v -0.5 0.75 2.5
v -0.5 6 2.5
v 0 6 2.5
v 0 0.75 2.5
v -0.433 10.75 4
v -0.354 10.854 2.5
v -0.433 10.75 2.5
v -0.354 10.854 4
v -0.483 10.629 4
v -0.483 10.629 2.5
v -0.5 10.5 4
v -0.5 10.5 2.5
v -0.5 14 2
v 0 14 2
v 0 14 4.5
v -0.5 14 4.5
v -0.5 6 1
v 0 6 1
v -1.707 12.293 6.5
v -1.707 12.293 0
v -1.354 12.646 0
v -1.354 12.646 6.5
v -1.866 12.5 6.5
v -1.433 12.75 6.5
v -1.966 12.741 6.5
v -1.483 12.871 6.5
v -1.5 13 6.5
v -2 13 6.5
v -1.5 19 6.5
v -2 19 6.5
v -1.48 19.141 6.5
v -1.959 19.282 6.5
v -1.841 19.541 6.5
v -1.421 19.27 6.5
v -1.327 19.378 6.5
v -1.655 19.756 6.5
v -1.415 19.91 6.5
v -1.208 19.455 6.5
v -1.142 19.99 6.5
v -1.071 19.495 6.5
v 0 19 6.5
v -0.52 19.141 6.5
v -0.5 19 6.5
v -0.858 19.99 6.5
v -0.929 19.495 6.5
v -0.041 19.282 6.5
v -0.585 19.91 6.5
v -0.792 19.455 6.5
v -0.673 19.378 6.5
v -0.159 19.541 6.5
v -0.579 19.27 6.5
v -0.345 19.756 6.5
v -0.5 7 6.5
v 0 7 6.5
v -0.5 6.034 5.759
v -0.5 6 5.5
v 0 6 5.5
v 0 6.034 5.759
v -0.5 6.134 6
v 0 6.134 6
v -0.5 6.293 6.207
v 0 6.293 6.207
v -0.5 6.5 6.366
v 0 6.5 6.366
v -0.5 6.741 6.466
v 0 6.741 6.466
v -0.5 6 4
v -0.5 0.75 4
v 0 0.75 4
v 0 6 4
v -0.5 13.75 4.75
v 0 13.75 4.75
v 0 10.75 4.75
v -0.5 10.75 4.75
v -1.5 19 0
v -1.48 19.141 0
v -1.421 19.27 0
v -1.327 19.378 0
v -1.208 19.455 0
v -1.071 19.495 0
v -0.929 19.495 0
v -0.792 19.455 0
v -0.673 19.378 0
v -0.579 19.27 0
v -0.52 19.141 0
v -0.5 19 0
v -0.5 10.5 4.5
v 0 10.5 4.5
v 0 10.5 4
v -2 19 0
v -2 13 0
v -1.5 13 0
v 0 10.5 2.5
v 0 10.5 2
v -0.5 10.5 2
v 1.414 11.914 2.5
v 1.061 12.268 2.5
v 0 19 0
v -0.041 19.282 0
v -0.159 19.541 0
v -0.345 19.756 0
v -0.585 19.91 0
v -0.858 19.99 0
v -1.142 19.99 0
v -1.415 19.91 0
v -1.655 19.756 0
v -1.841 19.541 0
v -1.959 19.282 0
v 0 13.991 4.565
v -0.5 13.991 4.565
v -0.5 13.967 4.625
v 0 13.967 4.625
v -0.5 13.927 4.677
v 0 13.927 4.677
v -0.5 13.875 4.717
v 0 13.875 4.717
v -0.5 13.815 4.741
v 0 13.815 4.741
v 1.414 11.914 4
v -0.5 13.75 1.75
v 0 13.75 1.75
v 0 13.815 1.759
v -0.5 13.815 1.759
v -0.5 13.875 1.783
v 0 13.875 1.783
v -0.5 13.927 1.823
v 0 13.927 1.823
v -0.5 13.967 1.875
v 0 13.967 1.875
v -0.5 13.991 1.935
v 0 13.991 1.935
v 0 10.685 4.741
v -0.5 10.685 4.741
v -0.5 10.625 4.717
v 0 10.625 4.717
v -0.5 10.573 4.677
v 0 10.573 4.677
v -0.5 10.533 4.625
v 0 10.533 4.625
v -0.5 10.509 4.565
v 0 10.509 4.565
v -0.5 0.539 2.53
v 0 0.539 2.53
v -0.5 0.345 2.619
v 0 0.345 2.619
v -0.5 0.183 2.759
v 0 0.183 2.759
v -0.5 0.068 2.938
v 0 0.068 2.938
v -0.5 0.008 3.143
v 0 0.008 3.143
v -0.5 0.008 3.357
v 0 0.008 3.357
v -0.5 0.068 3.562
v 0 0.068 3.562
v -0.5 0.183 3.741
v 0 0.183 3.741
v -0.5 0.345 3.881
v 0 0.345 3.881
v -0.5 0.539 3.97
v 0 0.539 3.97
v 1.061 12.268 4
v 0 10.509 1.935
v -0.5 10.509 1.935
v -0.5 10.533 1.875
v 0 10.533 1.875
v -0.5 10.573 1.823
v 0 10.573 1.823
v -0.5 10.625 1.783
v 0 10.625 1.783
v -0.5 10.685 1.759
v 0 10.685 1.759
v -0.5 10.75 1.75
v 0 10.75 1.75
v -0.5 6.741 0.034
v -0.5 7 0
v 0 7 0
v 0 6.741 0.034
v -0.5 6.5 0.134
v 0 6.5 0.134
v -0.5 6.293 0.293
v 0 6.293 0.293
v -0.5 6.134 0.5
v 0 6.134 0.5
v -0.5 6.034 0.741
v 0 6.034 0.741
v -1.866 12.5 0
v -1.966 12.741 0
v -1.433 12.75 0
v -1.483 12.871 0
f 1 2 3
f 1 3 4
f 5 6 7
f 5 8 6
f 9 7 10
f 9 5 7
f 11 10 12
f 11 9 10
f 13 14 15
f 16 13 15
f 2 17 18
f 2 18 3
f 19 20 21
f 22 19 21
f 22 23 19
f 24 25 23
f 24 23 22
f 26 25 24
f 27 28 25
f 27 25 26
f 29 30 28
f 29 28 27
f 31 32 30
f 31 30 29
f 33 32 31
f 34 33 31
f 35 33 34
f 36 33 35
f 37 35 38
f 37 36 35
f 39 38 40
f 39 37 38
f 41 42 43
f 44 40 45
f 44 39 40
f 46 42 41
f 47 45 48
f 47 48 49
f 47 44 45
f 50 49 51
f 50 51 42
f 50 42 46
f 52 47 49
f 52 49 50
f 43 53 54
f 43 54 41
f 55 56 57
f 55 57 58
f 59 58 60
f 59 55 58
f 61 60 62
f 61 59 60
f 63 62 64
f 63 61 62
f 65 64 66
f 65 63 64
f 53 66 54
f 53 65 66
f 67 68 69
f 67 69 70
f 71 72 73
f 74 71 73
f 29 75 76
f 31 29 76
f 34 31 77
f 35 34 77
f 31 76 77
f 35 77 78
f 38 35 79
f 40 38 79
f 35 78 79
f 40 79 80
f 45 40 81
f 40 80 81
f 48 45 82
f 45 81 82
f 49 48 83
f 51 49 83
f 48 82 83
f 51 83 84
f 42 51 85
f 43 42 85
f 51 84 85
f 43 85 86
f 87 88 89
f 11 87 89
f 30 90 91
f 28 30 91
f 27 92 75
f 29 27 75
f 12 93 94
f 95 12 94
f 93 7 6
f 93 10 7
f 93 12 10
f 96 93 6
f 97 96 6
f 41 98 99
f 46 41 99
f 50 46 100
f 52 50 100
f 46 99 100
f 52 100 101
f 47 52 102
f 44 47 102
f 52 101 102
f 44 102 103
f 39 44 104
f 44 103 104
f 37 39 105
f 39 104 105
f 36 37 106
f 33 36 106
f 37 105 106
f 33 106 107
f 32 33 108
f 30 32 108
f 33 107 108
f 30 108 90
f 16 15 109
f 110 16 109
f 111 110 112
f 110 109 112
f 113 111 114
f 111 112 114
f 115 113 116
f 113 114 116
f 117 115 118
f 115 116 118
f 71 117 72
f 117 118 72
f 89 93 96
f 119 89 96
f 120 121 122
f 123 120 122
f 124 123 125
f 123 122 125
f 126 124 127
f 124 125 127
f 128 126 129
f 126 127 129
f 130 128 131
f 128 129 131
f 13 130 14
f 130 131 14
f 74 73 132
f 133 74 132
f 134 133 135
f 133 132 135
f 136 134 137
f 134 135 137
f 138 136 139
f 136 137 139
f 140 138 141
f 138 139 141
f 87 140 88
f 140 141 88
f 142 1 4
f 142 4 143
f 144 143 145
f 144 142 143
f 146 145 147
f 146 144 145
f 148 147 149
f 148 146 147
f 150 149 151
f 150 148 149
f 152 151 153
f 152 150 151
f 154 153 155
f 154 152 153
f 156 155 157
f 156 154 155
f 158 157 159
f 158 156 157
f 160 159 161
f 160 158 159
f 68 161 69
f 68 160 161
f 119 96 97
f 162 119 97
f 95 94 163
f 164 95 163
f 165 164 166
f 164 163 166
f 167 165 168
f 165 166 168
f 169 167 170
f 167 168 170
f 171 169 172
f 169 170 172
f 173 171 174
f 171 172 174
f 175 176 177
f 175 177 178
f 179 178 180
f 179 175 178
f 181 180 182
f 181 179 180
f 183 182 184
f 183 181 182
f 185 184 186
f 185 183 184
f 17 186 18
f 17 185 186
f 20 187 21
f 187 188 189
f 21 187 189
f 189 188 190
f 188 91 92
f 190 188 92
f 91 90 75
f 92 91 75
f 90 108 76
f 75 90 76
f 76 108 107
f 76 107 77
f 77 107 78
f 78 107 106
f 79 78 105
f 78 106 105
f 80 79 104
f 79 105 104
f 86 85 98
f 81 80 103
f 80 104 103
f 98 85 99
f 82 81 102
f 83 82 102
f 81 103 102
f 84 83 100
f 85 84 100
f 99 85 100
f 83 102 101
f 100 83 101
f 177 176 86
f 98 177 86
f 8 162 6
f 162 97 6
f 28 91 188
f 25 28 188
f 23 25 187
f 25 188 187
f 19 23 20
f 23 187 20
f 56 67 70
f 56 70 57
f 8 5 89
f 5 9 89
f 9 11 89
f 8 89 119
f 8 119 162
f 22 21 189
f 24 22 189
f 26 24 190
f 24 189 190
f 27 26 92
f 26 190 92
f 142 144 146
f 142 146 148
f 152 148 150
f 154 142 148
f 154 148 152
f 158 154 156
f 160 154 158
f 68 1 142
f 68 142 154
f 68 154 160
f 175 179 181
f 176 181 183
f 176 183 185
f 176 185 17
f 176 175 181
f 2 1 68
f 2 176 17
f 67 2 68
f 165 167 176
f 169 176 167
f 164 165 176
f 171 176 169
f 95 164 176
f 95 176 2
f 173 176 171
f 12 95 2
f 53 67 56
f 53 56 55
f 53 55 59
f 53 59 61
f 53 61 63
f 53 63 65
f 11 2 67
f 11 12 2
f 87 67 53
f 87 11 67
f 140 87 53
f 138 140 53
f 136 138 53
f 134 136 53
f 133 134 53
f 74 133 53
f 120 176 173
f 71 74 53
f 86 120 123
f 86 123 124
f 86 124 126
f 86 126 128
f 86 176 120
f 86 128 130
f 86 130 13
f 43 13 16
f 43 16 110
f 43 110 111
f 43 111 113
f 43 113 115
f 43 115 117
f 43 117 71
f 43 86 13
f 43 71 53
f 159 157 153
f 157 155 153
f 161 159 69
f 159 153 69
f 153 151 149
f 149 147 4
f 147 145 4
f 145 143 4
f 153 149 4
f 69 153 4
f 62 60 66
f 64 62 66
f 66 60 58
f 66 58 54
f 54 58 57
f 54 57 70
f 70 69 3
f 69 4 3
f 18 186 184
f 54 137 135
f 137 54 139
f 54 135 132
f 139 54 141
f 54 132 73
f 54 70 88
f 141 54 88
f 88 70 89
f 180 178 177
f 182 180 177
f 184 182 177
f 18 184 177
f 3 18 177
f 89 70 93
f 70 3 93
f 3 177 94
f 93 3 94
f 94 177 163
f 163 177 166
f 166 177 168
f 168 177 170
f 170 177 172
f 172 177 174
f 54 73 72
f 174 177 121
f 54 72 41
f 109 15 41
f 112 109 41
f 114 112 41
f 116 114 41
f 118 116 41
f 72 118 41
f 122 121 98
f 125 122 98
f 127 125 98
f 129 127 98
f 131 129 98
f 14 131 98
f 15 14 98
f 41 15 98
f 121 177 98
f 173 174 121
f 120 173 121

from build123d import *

# Parameters (mm, degrees)
EXTRUDE_1_DEPTH     = 6.5
CUT_EXTRUDE_1_DEPTH = 2
SKETCH_3_W          = 2
SKETCH_3_H          = 2
CUT_EXTRUDE_2_DEPTH = 2.5
SKETCH_4_W          = 2
SKETCH_4_H          = 2
CUT_EXTRUDE_3_DEPTH = 2.5
CUT_EXTRUDE_4_DEPTH = 0.6
SKETCH_6_W          = 1.5
SKETCH_6_H          = 0.707106781
EXTRUDE_2_DEPTH     = 0.5
CUT_EXTRUDE_5_DEPTH = 2
FILLET_1_R          = 0.5


with BuildPart() as part:
    # Эскиз1 → Бобышка-Вытянуть1 (new body)
    with BuildSketch(Plane.XY):
        with BuildLine():
            Line((-2, 19), (-2, 13))
            ThreePointArc((-2, 13), (-1.923879533, 12.617316568), (-1.707106781, 12.292893219))
            Line((-1.707106781, 12.292893219), (-1.353553391, 12.646446609))
            ThreePointArc((-1.353553391, 12.646446609), (-1.461939766, 12.808658284), (-1.5, 13))
            Line((-1.5, 13), (-1.5, 19))
            ThreePointArc((-1.5, 19), (-1, 19.5), (-0.5, 19))
            Line((-0.5, 19), (-0.5, 0))
            Line((-0.5, 0), (0, 0))
            Line((0, 0), (0, 10.5))
            Line((0, 10.5), (1.414213562, 11.914213562))
            Line((1.414213562, 11.914213562), (1.060660172, 12.267766953))
            Line((1.060660172, 12.267766953), (0, 11.207106781))
            Line((0, 11.207106781), (0, 19))
            ThreePointArc((0, 19), (-1, 20), (-2, 19))
        make_face()
    extrude(amount=EXTRUDE_1_DEPTH)

    # Эскиз2 → Вырез-Вытянуть1 (cut)
    with BuildSketch(Plane.ZY.offset(0.5)):
        with BuildLine():
            Line((4, 6), (5.5, 6))
            ThreePointArc((5.5, 6), (6.207106781, 6.292893219), (6.5, 7))
            Line((6.5, 7), (8.5, 7))
            Line((8.5, 7), (8.5, -1))
            Line((8.5, -1), (-2, -1))
            Line((-2, -1), (-2, 7))
            Line((-2, 7), (0, 7))
            ThreePointArc((0, 7), (0.292893219, 6.292893219), (1, 6))
            Line((1, 6), (2.5, 6))
            Line((2.5, 6), (2.5, 0.75))
            ThreePointArc((2.5, 0.75), (3.25, 0), (4, 0.75))
            Line((4, 0.75), (4, 6))
        make_face()
    extrude(amount=-CUT_EXTRUDE_1_DEPTH, mode=Mode.SUBTRACT)

    # Эскиз3 → Вырез-Вытянуть2 (cut)
    with BuildSketch(Plane.XY.offset(6.5)):
        with Locations((1, 11.5)):
            Rectangle(SKETCH_3_W, SKETCH_3_H)
    extrude(amount=-CUT_EXTRUDE_2_DEPTH, mode=Mode.SUBTRACT)

    # Эскиз4 → Вырез-Вытянуть3 (cut)
    with BuildSketch(Plane(origin=(0, 0, 0), x_dir=(-1, 0, 0), z_dir=(0, 0, -1))):
        with Locations((-1, 11.5)):
            Rectangle(SKETCH_4_W, SKETCH_4_H)
    extrude(amount=-CUT_EXTRUDE_3_DEPTH, mode=Mode.SUBTRACT)

    # Эскиз5 → Вырез-Вытянуть4 (cut)
    with BuildSketch(Plane(origin=(0, 0, 0), x_dir=(0, 0, -1), z_dir=(1, 0, 0))):
        with BuildLine():
            Line((-3.25, 10.5), (-2, 10.5))
            ThreePointArc((-2, 10.5), (-1.823223305, 10.573223305), (-1.75, 10.75))
            Line((-1.75, 10.75), (-1.75, 13.75))
            ThreePointArc((-1.75, 13.75), (-1.823223305, 13.926776695), (-2, 14))
            Line((-2, 14), (-4.5, 14))
            ThreePointArc((-4.5, 14), (-4.676776695, 13.926776695), (-4.75, 13.75))
            Line((-4.75, 13.75), (-4.75, 10.75))
            ThreePointArc((-4.75, 10.75), (-4.676776695, 10.573223305), (-4.5, 10.5))
            Line((-4.5, 10.5), (-3.25, 10.5))
        make_face()
    extrude(amount=-CUT_EXTRUDE_4_DEPTH, mode=Mode.SUBTRACT)

    # Эскиз6 → Бобышка-Вытянуть2 (add)
    with BuildSketch(Plane.ZY):
        with Locations((3.25, 10.853553391)):
            Rectangle(SKETCH_6_W, SKETCH_6_H)
    extrude(amount=EXTRUDE_2_DEPTH)

    # Эскиз7 → Вырез-Вытянуть5 (cut)
    with BuildSketch(Plane(origin=(0, 0, 2.5), x_dir=(-1, 0, 0), z_dir=(0, 0, -1))):
        Polygon((0, 11.207106781), (0.5, 10.707106781), (1, 10.707106781), (1, 11.207106781), align=None)
    extrude(amount=-CUT_EXTRUDE_5_DEPTH, mode=Mode.SUBTRACT)

    # Скругление1
    fillet_1_edges = [part.edges().sort_by_distance(p)[0] for p in [
        (-0.5, 10.707106781, 3.25),
    ]]
    fillet(fillet_1_edges, radius=FILLET_1_R)


solid = part.part
